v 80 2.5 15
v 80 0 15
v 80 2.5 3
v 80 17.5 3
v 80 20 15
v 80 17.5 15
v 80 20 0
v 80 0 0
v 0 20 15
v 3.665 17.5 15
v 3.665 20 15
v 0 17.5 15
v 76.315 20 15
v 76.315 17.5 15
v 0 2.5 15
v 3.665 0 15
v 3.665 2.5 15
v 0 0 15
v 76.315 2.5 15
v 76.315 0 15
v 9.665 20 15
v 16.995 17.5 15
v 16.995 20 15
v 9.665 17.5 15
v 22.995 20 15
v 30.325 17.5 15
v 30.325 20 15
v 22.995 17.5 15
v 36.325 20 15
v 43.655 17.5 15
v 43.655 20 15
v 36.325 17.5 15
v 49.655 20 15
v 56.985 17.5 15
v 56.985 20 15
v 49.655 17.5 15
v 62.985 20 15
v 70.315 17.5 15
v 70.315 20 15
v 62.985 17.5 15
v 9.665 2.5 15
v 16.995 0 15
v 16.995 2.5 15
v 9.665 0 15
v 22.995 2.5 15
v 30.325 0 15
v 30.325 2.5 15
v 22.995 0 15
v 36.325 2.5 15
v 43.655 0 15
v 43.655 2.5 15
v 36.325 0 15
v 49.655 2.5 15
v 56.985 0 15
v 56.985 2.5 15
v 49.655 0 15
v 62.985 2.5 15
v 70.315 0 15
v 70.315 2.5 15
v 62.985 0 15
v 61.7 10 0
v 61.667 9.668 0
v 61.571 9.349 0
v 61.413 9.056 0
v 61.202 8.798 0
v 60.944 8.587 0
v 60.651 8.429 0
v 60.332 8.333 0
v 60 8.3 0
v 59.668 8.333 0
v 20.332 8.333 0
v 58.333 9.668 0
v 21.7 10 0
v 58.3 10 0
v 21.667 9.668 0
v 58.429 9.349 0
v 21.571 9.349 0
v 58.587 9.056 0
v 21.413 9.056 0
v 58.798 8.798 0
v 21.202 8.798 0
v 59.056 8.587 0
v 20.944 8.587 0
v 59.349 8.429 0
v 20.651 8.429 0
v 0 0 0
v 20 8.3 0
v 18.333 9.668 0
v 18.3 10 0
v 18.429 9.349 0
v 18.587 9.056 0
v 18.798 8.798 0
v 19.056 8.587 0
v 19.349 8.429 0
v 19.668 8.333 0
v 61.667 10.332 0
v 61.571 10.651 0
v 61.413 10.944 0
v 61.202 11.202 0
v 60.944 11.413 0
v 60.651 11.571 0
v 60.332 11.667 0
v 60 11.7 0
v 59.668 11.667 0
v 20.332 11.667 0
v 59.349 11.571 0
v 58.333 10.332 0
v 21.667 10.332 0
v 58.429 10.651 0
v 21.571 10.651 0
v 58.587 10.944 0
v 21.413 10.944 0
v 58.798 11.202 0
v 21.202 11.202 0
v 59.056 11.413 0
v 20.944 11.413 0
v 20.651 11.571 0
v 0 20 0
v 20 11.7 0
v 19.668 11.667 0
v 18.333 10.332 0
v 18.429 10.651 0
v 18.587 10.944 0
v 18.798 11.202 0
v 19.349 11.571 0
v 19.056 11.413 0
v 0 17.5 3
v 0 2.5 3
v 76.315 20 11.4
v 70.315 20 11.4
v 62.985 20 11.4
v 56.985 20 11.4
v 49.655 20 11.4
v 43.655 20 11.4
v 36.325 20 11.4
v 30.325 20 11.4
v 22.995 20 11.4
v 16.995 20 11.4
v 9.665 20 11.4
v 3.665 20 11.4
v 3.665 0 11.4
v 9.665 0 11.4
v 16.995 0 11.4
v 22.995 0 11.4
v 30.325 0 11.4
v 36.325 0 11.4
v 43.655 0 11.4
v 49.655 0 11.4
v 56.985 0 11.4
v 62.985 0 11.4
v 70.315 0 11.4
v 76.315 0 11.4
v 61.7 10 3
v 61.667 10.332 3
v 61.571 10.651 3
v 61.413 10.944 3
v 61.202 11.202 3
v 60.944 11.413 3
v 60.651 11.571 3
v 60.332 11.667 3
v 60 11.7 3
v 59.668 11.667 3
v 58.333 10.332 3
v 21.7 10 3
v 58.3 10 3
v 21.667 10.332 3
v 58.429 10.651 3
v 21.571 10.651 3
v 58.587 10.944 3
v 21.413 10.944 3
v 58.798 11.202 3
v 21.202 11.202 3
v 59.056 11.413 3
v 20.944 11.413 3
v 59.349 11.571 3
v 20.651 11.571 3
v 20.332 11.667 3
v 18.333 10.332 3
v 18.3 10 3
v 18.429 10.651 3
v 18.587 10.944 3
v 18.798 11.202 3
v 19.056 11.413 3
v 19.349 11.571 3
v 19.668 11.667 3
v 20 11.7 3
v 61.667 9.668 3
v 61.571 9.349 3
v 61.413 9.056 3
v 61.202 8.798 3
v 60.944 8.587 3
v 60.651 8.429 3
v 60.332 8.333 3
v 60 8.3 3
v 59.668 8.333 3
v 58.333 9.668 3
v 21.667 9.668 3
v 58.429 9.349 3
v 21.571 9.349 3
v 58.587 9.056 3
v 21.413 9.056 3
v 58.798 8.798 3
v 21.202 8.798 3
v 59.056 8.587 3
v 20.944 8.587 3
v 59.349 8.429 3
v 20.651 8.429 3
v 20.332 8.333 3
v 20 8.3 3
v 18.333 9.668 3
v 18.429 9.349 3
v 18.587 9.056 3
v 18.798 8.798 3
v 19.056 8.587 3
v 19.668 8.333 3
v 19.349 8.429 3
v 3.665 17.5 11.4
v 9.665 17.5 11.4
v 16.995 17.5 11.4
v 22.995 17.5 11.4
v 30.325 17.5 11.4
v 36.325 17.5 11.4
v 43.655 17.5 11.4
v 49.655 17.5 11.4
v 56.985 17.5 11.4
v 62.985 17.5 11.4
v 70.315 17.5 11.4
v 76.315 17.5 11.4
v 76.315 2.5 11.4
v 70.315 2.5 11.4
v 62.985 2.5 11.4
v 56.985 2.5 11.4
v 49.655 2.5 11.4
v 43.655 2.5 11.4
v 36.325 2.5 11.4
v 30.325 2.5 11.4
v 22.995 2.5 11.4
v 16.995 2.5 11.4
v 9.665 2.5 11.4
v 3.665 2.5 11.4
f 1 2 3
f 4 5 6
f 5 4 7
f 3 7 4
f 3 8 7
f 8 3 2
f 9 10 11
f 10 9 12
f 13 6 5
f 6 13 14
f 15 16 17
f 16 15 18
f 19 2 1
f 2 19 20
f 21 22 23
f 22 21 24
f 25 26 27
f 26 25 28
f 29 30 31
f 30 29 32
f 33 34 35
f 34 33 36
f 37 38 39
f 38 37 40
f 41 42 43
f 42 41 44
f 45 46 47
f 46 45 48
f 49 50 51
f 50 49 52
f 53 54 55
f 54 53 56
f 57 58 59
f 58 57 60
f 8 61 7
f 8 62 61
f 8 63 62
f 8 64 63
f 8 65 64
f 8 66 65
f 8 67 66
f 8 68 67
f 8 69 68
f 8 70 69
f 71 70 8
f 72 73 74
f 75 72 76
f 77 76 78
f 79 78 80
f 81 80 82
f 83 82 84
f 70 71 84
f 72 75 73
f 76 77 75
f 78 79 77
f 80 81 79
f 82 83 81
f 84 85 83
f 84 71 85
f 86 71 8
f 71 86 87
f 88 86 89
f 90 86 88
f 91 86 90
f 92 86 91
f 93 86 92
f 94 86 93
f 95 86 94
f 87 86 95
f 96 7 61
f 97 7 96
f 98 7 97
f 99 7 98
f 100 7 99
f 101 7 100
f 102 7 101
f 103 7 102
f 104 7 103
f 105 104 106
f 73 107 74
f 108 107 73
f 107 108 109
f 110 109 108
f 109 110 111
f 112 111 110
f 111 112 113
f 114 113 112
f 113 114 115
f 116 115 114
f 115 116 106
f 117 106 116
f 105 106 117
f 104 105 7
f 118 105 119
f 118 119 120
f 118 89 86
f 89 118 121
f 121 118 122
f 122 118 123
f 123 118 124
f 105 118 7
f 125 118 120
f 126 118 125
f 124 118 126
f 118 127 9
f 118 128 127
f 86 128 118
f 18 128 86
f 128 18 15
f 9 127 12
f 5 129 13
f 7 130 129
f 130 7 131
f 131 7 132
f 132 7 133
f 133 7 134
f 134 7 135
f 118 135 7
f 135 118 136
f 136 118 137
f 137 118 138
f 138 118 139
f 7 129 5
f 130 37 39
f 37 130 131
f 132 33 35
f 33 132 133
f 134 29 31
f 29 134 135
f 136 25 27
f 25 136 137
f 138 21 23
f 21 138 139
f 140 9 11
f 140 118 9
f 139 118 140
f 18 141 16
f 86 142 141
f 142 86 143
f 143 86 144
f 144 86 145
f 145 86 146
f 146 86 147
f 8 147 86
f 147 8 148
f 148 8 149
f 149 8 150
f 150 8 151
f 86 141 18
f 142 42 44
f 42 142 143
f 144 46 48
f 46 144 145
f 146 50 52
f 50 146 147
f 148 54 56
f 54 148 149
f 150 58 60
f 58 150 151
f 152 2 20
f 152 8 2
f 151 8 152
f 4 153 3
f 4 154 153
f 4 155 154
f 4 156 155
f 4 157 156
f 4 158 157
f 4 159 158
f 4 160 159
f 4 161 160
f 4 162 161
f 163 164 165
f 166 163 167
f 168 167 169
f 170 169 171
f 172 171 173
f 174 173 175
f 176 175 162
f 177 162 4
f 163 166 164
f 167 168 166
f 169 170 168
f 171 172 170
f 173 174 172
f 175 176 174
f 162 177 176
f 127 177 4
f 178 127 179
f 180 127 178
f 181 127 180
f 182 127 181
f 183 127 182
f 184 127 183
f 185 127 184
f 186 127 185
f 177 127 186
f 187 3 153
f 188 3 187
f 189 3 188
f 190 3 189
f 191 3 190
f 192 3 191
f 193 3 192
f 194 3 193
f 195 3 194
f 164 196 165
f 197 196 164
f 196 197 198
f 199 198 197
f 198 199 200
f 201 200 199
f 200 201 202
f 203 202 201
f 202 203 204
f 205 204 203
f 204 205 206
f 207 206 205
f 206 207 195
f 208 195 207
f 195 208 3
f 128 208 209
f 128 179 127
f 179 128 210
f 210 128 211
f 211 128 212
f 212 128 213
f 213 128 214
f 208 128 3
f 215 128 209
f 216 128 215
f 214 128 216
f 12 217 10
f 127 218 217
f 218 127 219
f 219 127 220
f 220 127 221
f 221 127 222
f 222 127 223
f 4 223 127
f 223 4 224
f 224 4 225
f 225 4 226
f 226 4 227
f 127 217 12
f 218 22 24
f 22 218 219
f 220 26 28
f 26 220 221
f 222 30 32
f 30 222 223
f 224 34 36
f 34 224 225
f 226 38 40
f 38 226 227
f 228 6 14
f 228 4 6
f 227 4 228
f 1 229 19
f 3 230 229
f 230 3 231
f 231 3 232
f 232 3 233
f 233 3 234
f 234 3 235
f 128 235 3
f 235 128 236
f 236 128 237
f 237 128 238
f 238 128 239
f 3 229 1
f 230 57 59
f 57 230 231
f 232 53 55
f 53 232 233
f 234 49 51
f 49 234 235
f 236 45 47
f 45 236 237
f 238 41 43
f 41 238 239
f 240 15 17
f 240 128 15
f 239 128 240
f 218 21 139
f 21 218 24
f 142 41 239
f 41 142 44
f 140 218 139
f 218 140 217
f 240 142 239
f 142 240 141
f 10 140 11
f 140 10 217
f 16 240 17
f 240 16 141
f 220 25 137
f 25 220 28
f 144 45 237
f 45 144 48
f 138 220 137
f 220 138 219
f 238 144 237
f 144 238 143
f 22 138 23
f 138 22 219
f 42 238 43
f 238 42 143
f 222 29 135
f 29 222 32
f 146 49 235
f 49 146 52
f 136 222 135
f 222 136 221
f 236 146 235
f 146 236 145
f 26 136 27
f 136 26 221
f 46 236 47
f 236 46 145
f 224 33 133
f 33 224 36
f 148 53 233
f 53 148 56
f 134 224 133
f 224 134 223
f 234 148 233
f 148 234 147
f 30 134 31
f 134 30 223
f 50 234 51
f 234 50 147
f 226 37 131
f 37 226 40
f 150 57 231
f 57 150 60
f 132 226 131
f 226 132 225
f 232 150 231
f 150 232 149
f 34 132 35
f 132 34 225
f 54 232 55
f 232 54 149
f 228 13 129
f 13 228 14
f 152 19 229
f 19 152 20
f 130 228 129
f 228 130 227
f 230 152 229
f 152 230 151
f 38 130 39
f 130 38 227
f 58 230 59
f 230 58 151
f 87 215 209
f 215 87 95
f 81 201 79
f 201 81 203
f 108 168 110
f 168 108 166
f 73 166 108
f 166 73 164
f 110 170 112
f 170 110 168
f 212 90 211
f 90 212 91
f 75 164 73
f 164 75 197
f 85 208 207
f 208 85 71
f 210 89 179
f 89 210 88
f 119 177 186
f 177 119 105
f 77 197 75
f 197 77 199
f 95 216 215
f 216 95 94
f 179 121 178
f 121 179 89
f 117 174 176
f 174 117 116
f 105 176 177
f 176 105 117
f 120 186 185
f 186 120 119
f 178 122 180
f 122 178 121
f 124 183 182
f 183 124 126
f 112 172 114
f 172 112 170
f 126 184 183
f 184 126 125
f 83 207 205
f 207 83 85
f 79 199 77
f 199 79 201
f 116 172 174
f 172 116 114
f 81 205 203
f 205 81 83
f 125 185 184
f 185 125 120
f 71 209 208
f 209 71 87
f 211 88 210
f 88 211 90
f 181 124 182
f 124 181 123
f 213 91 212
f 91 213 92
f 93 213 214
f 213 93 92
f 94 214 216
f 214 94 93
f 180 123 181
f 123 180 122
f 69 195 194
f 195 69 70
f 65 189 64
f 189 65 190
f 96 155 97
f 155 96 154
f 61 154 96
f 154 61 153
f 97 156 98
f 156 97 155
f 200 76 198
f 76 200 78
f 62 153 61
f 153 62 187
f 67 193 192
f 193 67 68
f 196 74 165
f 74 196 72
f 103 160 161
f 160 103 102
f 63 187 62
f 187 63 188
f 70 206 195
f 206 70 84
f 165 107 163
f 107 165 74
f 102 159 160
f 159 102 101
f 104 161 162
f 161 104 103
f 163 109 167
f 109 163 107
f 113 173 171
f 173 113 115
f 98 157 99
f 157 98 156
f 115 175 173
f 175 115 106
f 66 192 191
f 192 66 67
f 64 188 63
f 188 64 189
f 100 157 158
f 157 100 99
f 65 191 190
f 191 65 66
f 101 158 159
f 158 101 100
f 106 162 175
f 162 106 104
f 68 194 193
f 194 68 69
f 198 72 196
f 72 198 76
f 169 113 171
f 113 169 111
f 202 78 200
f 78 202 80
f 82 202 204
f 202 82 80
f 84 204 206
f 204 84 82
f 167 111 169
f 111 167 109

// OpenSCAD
$fn = 32;

// ----------------------------------------------------------------------
// Cable duct: 80 x 20 x 15 mm, 6 fingers
// ----------------------------------------------------------------------

// --- parameters (mm) ---
tray_len = 80;            // duct length, X
tray_w = 20;              // duct width, Y
tray_h = 15;              // duct height, Z
tray_t = 2.5;             // side wall thickness
floor_t = 3;              // floor thickness
slot_w = 6;               // finger slot width
slot_h = 8.4;             // finger slot height
fingers = 6;              // number of finger slots per side
pitch = 13.33;            // finger pitch
hole_d = 3.4;             // floor mounting hole
hole_n = 2;               // mounting holes in the floor

module shell() {
  difference() {
    cube([tray_len, tray_w, tray_h]);
    /* open top channel */
    translate([-tray_t - 1, tray_t, floor_t])
      cube([tray_len + 2 * tray_t + 2, tray_w - 2 * tray_t, tray_h + 1]);
  }
}

difference() {
  union() {
    shell();
  }
  /* finger slots cut through both side walls */
  for (i = [0 : fingers - 1]) translate([pitch / 2 + i * pitch - slot_w / 2, -1, floor_t + slot_h]) cube([slot_w, tray_w + 2, tray_h]);
  for (i = [0 : hole_n - 1]) translate([(tray_len / hole_n) * (i + 0.5), tray_w / 2, -1]) cylinder(h = floor_t + 2, d = hole_d);
}
